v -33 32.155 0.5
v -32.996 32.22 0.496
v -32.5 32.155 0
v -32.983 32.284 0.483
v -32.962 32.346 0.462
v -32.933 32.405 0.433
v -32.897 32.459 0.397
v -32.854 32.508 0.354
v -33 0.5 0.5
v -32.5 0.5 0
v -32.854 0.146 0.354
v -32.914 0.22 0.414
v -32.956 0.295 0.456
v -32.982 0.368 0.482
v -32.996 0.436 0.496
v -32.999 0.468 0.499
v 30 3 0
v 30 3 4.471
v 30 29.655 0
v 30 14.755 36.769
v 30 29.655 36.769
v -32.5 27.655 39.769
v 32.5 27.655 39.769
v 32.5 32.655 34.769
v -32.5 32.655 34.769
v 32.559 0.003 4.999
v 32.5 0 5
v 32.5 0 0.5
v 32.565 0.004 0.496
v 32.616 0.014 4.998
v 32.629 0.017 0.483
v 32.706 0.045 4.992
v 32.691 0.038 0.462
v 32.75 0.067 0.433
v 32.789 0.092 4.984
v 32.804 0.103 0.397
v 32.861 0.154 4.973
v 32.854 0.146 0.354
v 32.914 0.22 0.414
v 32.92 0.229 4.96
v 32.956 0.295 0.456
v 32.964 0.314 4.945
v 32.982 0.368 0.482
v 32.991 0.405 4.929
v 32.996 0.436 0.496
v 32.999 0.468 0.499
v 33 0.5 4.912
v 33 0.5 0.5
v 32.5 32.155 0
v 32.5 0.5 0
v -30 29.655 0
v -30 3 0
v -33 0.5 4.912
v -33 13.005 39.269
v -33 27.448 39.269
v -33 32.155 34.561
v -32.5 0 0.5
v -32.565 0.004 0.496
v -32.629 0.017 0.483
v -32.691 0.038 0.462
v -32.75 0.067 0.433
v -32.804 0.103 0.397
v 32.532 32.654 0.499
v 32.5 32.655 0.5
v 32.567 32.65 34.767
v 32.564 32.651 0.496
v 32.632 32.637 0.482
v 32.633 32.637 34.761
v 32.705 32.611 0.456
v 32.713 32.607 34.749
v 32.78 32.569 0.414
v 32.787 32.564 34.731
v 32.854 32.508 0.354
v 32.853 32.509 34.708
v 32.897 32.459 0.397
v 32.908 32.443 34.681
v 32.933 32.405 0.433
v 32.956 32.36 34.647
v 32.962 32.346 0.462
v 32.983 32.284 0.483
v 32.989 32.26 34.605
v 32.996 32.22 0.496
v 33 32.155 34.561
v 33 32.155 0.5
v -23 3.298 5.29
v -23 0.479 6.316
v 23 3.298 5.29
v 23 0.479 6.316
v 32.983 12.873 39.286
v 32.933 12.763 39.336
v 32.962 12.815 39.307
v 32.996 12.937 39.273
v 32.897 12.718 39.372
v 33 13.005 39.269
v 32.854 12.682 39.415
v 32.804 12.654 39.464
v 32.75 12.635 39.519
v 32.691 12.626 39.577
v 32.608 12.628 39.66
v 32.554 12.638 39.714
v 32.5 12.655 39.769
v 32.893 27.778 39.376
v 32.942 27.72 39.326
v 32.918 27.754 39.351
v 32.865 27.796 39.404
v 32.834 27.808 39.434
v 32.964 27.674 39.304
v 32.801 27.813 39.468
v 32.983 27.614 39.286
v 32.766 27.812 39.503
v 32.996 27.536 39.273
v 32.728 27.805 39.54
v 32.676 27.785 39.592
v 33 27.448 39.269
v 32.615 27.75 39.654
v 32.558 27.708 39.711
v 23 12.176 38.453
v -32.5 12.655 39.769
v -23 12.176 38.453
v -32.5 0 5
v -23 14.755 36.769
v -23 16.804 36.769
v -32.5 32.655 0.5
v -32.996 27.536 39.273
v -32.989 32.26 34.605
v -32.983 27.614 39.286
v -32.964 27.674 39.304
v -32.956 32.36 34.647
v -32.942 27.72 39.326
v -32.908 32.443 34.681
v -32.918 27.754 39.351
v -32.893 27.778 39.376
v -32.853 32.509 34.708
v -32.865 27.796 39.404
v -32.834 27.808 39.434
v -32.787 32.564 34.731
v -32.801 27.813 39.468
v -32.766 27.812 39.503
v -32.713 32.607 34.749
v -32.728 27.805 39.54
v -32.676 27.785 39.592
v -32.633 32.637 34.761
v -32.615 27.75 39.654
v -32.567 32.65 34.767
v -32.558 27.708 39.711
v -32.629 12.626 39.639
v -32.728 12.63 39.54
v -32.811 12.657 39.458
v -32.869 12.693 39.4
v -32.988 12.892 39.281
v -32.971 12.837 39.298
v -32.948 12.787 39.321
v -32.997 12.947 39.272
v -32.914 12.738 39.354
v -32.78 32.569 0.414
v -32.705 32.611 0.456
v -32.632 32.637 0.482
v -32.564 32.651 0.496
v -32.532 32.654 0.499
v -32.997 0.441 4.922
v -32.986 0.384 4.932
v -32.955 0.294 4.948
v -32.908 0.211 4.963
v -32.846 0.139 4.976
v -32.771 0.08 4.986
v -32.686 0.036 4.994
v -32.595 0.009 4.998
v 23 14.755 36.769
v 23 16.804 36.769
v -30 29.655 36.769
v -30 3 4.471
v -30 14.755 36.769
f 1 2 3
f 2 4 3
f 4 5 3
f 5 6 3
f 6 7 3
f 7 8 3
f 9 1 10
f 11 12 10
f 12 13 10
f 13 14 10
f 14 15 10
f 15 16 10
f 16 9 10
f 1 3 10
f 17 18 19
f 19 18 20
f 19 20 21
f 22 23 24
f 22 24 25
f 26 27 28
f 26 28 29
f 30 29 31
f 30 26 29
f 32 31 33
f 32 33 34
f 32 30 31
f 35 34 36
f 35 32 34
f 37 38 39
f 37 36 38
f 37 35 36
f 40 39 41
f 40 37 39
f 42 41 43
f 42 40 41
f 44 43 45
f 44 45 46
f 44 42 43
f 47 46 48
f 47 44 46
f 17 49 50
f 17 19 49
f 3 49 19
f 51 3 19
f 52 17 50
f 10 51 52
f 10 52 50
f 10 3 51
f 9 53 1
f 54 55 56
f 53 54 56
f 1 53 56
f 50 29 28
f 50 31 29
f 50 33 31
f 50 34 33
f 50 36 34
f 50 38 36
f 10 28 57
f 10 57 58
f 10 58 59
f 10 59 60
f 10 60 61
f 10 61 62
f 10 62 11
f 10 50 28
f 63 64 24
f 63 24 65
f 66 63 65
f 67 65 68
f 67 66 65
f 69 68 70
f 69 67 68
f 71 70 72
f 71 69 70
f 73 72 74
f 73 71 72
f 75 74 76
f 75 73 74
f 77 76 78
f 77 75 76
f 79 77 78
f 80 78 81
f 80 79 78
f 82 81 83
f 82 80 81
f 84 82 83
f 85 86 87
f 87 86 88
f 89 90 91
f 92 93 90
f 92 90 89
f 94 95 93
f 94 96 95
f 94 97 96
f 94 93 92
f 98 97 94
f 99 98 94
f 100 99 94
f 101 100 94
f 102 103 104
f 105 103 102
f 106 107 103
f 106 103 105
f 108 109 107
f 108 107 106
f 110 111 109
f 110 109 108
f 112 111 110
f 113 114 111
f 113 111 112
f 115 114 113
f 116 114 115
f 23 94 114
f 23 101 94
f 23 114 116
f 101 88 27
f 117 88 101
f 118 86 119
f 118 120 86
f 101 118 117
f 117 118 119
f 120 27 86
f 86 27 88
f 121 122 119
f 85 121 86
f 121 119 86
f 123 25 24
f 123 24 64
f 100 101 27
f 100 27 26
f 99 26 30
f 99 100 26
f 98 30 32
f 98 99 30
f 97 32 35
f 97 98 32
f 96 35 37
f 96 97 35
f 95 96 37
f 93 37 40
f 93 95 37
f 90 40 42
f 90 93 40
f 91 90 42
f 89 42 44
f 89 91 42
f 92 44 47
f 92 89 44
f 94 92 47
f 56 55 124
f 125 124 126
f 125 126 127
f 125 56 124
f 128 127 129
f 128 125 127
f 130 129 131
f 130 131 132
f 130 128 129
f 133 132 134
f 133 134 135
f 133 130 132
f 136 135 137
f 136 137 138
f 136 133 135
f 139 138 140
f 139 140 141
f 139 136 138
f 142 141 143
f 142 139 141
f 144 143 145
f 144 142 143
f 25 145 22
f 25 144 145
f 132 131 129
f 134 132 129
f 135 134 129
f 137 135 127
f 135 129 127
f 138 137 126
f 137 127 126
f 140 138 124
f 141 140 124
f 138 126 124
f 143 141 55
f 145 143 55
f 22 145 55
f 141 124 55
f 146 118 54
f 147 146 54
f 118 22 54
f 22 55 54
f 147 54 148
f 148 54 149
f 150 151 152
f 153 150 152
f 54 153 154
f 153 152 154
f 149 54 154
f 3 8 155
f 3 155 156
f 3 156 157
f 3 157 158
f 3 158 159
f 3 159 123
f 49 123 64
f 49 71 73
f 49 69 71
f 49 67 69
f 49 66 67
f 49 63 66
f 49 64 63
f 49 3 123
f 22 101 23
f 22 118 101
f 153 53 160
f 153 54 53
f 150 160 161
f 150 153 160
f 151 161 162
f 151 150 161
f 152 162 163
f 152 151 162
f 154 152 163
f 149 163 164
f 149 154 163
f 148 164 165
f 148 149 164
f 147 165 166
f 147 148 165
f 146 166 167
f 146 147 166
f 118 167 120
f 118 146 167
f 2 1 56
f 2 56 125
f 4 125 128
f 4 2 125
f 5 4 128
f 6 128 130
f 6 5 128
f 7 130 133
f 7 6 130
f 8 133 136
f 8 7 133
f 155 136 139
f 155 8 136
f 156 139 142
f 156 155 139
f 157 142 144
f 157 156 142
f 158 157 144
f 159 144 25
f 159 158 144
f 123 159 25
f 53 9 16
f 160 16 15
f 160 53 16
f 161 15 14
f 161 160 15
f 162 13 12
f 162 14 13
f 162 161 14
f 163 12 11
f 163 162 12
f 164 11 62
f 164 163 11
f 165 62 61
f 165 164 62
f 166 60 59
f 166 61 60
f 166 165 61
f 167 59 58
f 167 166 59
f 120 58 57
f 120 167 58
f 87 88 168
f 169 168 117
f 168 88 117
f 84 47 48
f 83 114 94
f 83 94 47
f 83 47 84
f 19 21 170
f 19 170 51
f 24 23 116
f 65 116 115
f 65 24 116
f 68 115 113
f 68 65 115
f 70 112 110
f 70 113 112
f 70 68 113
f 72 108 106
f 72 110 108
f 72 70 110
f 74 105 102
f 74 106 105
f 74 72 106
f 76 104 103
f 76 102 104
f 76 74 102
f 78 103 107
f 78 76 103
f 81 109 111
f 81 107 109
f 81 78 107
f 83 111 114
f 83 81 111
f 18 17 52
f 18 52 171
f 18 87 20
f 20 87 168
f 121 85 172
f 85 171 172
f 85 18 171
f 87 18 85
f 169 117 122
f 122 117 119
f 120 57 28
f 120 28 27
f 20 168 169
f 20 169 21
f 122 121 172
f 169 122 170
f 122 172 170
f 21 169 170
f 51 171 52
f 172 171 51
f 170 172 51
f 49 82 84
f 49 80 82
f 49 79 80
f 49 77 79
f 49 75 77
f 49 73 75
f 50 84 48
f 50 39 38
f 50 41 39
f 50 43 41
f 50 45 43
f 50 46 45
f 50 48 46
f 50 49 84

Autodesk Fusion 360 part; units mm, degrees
sketch "Sketch1" plane through (0, 0, 0) normal (1, 0, 0) x (0, 1, 0)
  line L0 (0, 0) -> (0, 5)
  line L1 (0, 5) -> (12.6547, 39.7686)
  line L2 (0, 5) -> (37, 5) construction
  line L3 (12.6547, 39.7686) -> (32.6547, 39.7686)
  line L4 (32.6547, 39.7686) -> (32.6547, 0)
  line L5 (32.6547, 0) -> (0, 0)
  dimension "d1" = 70
  dimension "d2" = 37
  dimension "d3" = 20
extrude "Extrude1" add sketch "Sketch1" along normal mid plane 66
shell "Shell1" thickness 3 removed faces 1 at (11, 10.8849, 0)
chamfer "Chamfer1" distance 5 angle 45 1 edges at (0, 32.6547, 39.7686)
chamfer "Chamfer1" distance 0.5 angle 45 6 edges at (33, 22.6547, 39.7686) (-33, 22.6547, 39.7686) (0, 32.6547, 0) (33, 16.3274, 0) (0, 0, 0) (-33, 16.3274, 0)
fillet "Fillet1" radius 0.5 8 edges at (-33, 6.2364, 22.1343) (33, 6.2364, 22.1343) (-33, 32.6547, 17.6343) (33, 32.6547, 17.6343) (33, 30.4047, 37.0186) (-33, 30.4047, 37.0186) (-33, 0, 2.75) (33, 0, 2.75)
sketch "Sketch2" plane through (0, -1.607, 0.5849) normal (0, -0.9397, 0.342) x (1, 0, 0)
  line L0 (32.5, 4.6985) -> (32.5, 41.6985)
  line L1 (32.5, 41.6985) -> (-32.5, 41.6985)
  line L2 (-32.5, 41.6985) -> (-32.5, 4.6985)
  line L3 (-32.5, 4.6985) -> (32.5, 4.6985)
  line L4 (-32.5, 41.6985) -> (32.5, 4.6985) construction
  line L5 (32.5, 41.6985) -> (-32.5, 4.6985) construction
  line L6 (23, 40.2985) -> (-23, 40.2985)
  line L7 (-23, 40.2985) -> (-23, 6.0985)
  line L8 (-23, 6.0985) -> (23, 6.0985)
  line L9 (23, 6.0985) -> (23, 40.2985)
  line L10 (23, 40.2985) -> (-23, 6.0985) construction
  line L11 (-23, 40.2985) -> (23, 6.0985) construction
  point P0 (0, 23.1985)
  dimension "d13" = 46
  dimension "d14" = 34.2
extrude "Extrude2" cut sketch "Sketch2" against normal blind 6 contours L6 L7 L8 L9
